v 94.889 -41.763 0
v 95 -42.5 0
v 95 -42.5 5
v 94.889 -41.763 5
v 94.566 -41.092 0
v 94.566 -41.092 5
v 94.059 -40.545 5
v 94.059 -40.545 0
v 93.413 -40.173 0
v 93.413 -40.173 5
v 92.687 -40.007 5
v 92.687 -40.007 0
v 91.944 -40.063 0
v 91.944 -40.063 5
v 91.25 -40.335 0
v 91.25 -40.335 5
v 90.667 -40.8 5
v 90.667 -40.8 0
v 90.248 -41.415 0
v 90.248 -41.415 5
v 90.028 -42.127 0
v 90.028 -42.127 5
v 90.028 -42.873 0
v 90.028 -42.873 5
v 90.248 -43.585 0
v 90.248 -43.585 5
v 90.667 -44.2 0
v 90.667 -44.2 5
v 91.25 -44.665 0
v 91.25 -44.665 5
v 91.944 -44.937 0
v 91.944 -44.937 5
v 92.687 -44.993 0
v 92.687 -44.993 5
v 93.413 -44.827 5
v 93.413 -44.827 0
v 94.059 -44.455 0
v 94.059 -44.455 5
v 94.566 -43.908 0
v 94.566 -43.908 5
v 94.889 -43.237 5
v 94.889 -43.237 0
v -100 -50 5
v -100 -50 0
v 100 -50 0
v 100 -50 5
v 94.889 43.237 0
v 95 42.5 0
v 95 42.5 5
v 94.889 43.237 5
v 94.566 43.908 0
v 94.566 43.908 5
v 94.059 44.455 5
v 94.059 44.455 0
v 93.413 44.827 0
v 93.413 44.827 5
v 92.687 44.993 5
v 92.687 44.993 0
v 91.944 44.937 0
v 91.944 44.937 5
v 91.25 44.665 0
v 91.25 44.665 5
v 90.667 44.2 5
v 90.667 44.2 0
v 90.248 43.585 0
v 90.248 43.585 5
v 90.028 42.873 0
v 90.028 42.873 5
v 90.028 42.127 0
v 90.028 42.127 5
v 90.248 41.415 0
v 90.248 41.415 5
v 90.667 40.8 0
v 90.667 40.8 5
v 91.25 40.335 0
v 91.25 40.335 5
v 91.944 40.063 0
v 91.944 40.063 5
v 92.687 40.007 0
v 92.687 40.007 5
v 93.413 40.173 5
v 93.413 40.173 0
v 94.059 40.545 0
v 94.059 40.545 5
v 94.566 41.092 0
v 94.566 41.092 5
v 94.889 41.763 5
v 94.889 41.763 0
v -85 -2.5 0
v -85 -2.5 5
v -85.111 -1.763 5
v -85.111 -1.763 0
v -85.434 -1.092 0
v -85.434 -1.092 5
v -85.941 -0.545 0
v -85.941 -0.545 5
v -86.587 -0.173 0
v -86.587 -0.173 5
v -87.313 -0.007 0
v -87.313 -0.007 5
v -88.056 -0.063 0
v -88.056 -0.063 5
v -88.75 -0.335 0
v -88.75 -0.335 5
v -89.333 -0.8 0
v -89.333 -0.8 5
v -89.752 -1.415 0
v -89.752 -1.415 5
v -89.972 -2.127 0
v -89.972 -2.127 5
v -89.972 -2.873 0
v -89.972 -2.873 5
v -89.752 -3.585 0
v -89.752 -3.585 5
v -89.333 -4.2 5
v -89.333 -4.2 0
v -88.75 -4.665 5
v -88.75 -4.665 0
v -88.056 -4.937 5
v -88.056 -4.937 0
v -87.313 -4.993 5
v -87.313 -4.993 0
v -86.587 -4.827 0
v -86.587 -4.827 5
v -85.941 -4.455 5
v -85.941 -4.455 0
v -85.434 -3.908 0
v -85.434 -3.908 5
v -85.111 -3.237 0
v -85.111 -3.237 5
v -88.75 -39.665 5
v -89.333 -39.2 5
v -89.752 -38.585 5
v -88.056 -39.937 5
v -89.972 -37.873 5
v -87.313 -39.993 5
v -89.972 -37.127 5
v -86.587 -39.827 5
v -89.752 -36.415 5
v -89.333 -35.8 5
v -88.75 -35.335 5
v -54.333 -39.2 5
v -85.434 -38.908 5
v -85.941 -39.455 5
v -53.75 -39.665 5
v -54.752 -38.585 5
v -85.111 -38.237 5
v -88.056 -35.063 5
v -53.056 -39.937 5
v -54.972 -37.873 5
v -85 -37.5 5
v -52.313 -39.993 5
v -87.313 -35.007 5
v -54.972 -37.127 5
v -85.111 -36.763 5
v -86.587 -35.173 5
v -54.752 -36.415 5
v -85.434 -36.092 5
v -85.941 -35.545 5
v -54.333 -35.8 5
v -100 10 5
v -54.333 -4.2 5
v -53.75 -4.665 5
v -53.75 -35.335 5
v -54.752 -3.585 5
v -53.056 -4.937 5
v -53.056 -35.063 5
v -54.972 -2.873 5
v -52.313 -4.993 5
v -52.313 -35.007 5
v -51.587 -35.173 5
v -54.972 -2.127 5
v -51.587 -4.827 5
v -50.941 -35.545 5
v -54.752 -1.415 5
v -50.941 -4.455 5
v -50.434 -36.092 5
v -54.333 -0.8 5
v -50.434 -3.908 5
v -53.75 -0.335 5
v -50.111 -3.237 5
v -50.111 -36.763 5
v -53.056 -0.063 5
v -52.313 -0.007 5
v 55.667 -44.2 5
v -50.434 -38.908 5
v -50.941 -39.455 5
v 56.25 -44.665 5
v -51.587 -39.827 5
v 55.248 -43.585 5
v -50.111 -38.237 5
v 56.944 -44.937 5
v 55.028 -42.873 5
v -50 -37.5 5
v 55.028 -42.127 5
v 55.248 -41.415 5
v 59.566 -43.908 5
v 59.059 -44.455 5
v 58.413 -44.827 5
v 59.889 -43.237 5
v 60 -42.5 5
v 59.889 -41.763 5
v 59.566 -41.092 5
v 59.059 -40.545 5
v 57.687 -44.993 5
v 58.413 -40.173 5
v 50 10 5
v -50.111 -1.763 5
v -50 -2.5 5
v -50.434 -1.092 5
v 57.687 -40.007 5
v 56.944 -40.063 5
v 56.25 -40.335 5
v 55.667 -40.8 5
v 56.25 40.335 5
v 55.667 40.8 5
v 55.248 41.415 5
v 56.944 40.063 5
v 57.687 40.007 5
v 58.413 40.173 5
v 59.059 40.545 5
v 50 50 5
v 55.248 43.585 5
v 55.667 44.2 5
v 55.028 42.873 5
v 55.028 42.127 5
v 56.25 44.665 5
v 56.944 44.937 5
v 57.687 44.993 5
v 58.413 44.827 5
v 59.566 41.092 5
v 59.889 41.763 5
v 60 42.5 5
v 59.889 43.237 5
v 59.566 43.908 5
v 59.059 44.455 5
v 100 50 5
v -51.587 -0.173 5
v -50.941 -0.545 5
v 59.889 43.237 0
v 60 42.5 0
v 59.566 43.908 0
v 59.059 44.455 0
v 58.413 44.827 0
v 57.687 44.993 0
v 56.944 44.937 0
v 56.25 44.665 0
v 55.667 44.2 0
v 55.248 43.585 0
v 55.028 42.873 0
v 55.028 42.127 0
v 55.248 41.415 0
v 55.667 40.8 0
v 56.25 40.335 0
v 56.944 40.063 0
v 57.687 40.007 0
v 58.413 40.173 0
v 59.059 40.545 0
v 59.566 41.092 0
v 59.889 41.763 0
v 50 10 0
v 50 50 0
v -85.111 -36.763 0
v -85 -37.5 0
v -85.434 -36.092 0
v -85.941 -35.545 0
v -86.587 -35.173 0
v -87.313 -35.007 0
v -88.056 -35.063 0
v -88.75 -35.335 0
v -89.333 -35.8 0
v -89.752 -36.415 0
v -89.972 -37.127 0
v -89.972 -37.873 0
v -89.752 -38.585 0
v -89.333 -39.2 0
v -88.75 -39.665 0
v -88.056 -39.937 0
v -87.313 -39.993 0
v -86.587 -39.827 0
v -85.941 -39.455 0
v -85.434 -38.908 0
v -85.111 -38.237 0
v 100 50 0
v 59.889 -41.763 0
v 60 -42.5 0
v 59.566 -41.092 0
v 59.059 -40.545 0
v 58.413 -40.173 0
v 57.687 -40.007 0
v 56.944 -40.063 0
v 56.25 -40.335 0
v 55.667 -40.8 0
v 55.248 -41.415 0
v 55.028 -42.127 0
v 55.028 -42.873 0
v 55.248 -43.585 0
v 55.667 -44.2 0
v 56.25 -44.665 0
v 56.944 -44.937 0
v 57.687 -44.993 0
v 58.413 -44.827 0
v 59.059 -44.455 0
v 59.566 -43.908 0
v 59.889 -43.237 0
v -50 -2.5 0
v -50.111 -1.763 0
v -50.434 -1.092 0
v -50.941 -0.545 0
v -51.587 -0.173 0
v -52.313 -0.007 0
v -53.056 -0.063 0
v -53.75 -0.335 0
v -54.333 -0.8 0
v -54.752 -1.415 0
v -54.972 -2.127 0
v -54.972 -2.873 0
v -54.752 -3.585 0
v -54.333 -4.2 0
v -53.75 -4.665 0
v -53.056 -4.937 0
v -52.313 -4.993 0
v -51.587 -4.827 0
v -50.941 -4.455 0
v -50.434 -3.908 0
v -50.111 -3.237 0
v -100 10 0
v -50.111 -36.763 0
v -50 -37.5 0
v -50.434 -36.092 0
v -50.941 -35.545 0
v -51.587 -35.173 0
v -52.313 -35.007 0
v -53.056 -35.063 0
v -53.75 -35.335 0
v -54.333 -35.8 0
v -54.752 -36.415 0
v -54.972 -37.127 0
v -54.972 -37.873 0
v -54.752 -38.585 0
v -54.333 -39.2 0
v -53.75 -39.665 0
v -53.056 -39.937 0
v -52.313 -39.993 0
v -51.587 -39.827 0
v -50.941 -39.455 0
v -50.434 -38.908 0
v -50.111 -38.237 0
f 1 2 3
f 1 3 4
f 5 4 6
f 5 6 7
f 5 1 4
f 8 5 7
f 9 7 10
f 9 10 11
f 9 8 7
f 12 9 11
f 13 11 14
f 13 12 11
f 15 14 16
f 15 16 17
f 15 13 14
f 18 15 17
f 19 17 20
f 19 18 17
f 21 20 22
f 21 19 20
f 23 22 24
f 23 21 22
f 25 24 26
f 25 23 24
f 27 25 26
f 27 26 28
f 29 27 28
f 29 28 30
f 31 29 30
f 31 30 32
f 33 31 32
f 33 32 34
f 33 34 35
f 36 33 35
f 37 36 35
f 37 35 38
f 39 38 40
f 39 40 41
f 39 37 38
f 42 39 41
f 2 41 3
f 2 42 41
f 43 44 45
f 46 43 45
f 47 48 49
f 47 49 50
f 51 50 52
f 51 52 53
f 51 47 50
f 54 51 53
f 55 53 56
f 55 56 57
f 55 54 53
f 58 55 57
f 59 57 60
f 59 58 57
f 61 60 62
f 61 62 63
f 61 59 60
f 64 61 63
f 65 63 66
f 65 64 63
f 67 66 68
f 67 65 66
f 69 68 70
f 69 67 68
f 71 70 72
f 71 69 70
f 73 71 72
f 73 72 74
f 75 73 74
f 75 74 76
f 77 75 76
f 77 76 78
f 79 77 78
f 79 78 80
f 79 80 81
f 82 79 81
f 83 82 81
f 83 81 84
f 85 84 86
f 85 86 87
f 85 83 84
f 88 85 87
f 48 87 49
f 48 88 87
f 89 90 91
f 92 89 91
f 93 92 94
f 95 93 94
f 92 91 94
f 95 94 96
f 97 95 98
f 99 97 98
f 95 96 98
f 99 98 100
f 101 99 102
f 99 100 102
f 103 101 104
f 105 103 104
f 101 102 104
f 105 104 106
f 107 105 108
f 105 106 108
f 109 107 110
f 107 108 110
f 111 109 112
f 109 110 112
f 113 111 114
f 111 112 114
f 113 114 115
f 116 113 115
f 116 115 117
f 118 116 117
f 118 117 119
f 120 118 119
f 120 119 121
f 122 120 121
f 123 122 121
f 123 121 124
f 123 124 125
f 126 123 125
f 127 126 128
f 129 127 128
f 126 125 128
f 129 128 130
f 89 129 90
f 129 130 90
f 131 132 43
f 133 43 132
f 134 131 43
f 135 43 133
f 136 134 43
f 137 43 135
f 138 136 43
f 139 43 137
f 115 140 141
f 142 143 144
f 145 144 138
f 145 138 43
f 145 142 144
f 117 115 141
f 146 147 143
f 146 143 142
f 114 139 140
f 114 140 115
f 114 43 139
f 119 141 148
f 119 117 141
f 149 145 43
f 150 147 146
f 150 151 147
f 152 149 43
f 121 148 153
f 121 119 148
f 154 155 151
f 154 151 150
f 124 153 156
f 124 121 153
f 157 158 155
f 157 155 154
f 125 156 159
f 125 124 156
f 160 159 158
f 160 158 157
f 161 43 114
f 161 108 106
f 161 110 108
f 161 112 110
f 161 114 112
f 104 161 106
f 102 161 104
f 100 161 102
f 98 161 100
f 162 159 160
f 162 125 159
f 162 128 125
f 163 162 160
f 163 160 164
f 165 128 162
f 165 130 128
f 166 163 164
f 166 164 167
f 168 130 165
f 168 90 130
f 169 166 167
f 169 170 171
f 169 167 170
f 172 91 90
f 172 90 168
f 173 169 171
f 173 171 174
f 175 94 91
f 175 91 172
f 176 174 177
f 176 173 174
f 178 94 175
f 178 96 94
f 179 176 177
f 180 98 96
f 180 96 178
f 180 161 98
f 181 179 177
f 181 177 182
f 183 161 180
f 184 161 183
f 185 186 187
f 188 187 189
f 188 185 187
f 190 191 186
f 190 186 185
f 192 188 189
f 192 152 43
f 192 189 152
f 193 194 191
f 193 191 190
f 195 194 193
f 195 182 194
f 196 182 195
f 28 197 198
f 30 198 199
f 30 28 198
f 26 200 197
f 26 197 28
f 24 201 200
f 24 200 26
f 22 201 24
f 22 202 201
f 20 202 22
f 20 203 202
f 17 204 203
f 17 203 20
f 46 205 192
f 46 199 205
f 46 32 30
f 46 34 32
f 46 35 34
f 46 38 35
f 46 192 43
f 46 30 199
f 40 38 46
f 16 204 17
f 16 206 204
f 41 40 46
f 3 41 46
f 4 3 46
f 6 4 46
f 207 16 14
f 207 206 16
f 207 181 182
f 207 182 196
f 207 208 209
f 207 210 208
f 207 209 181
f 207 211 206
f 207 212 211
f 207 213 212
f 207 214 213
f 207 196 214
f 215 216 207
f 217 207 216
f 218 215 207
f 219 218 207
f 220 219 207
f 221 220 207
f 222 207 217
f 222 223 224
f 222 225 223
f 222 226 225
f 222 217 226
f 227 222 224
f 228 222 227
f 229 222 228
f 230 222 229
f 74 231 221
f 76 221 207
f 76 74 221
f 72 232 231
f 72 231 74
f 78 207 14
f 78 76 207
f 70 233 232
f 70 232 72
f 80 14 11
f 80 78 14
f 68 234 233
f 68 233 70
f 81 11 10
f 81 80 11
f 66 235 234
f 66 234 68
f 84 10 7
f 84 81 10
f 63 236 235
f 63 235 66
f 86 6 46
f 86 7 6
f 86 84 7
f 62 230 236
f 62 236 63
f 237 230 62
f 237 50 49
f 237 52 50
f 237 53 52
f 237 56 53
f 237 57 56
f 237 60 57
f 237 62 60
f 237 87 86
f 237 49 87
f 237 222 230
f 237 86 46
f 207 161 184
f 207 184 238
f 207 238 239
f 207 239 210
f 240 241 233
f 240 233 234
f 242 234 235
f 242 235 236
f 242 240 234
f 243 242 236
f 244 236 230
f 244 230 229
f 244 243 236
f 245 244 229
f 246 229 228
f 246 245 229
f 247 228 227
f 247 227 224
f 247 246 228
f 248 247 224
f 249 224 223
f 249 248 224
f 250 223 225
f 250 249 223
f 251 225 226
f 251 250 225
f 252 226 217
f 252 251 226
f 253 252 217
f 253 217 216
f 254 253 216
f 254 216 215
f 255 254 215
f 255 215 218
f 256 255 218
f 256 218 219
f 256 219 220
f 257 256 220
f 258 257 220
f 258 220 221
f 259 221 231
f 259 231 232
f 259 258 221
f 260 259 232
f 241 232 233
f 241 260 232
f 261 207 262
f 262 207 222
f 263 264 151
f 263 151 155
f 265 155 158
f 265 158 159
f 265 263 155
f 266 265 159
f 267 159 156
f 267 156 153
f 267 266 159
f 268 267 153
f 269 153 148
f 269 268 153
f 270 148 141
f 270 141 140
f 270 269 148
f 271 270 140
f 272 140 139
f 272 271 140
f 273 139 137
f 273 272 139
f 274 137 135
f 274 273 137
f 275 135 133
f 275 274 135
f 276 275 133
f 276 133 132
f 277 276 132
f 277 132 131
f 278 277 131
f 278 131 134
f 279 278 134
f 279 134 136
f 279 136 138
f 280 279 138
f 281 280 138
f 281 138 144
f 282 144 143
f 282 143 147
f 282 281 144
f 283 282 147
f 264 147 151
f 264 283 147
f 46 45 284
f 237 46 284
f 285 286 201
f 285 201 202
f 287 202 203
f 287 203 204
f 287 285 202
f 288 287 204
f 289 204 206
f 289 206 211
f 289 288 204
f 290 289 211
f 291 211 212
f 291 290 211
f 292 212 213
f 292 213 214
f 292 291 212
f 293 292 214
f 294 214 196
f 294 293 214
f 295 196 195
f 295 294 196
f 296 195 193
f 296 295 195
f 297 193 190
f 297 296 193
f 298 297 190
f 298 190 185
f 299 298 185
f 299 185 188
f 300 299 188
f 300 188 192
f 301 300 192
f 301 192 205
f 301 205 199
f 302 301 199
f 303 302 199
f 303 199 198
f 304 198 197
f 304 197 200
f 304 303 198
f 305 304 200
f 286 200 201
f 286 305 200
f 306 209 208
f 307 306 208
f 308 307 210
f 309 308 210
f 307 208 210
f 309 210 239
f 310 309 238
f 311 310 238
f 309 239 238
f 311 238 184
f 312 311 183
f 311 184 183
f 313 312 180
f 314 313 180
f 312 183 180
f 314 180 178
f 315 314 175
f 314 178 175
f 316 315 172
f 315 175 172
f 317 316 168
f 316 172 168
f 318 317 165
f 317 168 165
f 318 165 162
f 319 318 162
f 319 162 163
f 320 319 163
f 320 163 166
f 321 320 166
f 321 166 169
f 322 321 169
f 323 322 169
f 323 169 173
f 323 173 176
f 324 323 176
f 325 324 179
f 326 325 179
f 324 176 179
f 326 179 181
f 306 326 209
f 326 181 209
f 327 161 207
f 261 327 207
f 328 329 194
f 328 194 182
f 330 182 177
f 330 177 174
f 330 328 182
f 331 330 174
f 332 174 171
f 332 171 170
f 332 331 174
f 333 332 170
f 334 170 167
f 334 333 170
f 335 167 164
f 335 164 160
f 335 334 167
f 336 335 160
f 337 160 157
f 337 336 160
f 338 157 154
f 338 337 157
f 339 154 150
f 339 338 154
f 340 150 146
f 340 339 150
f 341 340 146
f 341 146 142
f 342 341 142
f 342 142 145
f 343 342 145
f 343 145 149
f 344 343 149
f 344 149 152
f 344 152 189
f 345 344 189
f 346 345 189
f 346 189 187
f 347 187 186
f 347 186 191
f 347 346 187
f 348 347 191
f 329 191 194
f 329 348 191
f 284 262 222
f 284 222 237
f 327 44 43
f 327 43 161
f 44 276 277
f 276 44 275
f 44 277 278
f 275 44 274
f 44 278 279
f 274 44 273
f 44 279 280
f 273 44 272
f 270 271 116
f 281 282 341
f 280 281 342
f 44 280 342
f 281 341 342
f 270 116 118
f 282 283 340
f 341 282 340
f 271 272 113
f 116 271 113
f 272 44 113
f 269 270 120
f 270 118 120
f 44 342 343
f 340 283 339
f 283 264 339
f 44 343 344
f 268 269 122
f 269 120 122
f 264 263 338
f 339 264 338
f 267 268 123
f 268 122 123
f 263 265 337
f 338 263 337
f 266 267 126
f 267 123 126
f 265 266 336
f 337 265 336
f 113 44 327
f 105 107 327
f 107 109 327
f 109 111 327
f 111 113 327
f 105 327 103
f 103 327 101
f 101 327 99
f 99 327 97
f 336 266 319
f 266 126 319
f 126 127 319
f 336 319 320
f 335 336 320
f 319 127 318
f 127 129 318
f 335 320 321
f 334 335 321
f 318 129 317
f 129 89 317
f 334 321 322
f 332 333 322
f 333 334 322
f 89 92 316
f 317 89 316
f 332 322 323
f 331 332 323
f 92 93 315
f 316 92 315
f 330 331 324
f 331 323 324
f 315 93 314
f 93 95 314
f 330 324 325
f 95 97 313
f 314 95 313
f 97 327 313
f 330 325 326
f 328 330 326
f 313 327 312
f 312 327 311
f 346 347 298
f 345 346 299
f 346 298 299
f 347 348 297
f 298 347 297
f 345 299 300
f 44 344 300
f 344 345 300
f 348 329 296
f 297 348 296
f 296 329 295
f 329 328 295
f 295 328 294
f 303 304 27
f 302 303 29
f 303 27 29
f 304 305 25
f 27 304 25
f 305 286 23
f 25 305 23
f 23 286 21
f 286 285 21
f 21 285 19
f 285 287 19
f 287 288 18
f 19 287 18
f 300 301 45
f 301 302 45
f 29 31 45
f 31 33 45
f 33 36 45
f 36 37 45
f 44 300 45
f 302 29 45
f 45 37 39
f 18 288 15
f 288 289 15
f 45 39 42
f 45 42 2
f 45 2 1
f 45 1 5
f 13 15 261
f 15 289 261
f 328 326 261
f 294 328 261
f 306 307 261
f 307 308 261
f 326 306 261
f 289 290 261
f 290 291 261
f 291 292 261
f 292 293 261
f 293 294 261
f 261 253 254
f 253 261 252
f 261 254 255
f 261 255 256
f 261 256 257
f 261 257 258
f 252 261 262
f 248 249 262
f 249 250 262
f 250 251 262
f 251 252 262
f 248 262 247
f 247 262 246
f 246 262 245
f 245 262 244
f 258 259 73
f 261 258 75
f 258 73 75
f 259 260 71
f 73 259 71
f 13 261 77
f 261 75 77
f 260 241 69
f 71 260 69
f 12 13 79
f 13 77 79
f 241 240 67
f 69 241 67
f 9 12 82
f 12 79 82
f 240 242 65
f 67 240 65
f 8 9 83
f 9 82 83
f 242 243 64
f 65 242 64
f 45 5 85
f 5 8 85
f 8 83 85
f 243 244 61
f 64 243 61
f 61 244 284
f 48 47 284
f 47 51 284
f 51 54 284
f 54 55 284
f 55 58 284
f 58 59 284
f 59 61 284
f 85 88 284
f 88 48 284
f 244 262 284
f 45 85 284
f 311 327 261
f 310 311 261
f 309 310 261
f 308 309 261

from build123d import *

# Parameters (mm, degrees)
SKETCH1_W           = 200
SKETCH1_H           = 100
SKETCH1_R           = 2.5
BOSS_EXTRUDE1_DEPTH = 5
SKETCH2_R           = 2.5
CUT_EXTRUDE1_DEPTH  = 5
SKETCH4_W           = 150
SKETCH4_H           = 40
CUT_EXTRUDE3_DEPTH  = 30


with BuildPart() as part:
    # Sketch1 → Boss-Extrude1 (new body)
    with BuildSketch(Plane.XY):
        Rectangle(SKETCH1_W, SKETCH1_H)
        with Locations((-92.5, 42.5)):
            Circle(SKETCH1_R, mode=Mode.SUBTRACT)
        with Locations((-57.5, 42.5)):
            Circle(SKETCH1_R, mode=Mode.SUBTRACT)
        with Locations((57.5, -42.5)):
            Circle(SKETCH1_R, mode=Mode.SUBTRACT)
        with Locations((92.5, -42.5)):
            Circle(SKETCH1_R, mode=Mode.SUBTRACT)
        with Locations((57.5, 42.5)):
            Circle(SKETCH1_R, mode=Mode.SUBTRACT)
        with Locations((92.5, 42.5)):
            Circle(SKETCH1_R, mode=Mode.SUBTRACT)
        with Locations((-87.5, -37.5)):
            Circle(SKETCH1_R, mode=Mode.SUBTRACT)
        with Locations((-52.5, -37.5)):
            Circle(SKETCH1_R, mode=Mode.SUBTRACT)
    extrude(amount=BOSS_EXTRUDE1_DEPTH)

    # Sketch2 → Cut-Extrude1 (cut)
    with BuildSketch(Plane.XY.offset(5)):
        with Locations((-87.5, -2.5)):
            Circle(SKETCH2_R)
        with Locations((-52.5, -2.5)):
            Circle(SKETCH2_R)
        with Locations((-87.5, -37.5)):
            Circle(SKETCH2_R)
        with Locations((-52.5, -37.5)):
            Circle(SKETCH2_R)
    extrude(amount=-CUT_EXTRUDE1_DEPTH, mode=Mode.SUBTRACT)

    # Sketch4 → Cut-Extrude3 (cut)
    with BuildSketch(Plane.XY.offset(5)):
        with Locations((-25, 30)):
            Rectangle(SKETCH4_W, SKETCH4_H)
    extrude(amount=-CUT_EXTRUDE3_DEPTH, mode=Mode.SUBTRACT)


solid = part.part
